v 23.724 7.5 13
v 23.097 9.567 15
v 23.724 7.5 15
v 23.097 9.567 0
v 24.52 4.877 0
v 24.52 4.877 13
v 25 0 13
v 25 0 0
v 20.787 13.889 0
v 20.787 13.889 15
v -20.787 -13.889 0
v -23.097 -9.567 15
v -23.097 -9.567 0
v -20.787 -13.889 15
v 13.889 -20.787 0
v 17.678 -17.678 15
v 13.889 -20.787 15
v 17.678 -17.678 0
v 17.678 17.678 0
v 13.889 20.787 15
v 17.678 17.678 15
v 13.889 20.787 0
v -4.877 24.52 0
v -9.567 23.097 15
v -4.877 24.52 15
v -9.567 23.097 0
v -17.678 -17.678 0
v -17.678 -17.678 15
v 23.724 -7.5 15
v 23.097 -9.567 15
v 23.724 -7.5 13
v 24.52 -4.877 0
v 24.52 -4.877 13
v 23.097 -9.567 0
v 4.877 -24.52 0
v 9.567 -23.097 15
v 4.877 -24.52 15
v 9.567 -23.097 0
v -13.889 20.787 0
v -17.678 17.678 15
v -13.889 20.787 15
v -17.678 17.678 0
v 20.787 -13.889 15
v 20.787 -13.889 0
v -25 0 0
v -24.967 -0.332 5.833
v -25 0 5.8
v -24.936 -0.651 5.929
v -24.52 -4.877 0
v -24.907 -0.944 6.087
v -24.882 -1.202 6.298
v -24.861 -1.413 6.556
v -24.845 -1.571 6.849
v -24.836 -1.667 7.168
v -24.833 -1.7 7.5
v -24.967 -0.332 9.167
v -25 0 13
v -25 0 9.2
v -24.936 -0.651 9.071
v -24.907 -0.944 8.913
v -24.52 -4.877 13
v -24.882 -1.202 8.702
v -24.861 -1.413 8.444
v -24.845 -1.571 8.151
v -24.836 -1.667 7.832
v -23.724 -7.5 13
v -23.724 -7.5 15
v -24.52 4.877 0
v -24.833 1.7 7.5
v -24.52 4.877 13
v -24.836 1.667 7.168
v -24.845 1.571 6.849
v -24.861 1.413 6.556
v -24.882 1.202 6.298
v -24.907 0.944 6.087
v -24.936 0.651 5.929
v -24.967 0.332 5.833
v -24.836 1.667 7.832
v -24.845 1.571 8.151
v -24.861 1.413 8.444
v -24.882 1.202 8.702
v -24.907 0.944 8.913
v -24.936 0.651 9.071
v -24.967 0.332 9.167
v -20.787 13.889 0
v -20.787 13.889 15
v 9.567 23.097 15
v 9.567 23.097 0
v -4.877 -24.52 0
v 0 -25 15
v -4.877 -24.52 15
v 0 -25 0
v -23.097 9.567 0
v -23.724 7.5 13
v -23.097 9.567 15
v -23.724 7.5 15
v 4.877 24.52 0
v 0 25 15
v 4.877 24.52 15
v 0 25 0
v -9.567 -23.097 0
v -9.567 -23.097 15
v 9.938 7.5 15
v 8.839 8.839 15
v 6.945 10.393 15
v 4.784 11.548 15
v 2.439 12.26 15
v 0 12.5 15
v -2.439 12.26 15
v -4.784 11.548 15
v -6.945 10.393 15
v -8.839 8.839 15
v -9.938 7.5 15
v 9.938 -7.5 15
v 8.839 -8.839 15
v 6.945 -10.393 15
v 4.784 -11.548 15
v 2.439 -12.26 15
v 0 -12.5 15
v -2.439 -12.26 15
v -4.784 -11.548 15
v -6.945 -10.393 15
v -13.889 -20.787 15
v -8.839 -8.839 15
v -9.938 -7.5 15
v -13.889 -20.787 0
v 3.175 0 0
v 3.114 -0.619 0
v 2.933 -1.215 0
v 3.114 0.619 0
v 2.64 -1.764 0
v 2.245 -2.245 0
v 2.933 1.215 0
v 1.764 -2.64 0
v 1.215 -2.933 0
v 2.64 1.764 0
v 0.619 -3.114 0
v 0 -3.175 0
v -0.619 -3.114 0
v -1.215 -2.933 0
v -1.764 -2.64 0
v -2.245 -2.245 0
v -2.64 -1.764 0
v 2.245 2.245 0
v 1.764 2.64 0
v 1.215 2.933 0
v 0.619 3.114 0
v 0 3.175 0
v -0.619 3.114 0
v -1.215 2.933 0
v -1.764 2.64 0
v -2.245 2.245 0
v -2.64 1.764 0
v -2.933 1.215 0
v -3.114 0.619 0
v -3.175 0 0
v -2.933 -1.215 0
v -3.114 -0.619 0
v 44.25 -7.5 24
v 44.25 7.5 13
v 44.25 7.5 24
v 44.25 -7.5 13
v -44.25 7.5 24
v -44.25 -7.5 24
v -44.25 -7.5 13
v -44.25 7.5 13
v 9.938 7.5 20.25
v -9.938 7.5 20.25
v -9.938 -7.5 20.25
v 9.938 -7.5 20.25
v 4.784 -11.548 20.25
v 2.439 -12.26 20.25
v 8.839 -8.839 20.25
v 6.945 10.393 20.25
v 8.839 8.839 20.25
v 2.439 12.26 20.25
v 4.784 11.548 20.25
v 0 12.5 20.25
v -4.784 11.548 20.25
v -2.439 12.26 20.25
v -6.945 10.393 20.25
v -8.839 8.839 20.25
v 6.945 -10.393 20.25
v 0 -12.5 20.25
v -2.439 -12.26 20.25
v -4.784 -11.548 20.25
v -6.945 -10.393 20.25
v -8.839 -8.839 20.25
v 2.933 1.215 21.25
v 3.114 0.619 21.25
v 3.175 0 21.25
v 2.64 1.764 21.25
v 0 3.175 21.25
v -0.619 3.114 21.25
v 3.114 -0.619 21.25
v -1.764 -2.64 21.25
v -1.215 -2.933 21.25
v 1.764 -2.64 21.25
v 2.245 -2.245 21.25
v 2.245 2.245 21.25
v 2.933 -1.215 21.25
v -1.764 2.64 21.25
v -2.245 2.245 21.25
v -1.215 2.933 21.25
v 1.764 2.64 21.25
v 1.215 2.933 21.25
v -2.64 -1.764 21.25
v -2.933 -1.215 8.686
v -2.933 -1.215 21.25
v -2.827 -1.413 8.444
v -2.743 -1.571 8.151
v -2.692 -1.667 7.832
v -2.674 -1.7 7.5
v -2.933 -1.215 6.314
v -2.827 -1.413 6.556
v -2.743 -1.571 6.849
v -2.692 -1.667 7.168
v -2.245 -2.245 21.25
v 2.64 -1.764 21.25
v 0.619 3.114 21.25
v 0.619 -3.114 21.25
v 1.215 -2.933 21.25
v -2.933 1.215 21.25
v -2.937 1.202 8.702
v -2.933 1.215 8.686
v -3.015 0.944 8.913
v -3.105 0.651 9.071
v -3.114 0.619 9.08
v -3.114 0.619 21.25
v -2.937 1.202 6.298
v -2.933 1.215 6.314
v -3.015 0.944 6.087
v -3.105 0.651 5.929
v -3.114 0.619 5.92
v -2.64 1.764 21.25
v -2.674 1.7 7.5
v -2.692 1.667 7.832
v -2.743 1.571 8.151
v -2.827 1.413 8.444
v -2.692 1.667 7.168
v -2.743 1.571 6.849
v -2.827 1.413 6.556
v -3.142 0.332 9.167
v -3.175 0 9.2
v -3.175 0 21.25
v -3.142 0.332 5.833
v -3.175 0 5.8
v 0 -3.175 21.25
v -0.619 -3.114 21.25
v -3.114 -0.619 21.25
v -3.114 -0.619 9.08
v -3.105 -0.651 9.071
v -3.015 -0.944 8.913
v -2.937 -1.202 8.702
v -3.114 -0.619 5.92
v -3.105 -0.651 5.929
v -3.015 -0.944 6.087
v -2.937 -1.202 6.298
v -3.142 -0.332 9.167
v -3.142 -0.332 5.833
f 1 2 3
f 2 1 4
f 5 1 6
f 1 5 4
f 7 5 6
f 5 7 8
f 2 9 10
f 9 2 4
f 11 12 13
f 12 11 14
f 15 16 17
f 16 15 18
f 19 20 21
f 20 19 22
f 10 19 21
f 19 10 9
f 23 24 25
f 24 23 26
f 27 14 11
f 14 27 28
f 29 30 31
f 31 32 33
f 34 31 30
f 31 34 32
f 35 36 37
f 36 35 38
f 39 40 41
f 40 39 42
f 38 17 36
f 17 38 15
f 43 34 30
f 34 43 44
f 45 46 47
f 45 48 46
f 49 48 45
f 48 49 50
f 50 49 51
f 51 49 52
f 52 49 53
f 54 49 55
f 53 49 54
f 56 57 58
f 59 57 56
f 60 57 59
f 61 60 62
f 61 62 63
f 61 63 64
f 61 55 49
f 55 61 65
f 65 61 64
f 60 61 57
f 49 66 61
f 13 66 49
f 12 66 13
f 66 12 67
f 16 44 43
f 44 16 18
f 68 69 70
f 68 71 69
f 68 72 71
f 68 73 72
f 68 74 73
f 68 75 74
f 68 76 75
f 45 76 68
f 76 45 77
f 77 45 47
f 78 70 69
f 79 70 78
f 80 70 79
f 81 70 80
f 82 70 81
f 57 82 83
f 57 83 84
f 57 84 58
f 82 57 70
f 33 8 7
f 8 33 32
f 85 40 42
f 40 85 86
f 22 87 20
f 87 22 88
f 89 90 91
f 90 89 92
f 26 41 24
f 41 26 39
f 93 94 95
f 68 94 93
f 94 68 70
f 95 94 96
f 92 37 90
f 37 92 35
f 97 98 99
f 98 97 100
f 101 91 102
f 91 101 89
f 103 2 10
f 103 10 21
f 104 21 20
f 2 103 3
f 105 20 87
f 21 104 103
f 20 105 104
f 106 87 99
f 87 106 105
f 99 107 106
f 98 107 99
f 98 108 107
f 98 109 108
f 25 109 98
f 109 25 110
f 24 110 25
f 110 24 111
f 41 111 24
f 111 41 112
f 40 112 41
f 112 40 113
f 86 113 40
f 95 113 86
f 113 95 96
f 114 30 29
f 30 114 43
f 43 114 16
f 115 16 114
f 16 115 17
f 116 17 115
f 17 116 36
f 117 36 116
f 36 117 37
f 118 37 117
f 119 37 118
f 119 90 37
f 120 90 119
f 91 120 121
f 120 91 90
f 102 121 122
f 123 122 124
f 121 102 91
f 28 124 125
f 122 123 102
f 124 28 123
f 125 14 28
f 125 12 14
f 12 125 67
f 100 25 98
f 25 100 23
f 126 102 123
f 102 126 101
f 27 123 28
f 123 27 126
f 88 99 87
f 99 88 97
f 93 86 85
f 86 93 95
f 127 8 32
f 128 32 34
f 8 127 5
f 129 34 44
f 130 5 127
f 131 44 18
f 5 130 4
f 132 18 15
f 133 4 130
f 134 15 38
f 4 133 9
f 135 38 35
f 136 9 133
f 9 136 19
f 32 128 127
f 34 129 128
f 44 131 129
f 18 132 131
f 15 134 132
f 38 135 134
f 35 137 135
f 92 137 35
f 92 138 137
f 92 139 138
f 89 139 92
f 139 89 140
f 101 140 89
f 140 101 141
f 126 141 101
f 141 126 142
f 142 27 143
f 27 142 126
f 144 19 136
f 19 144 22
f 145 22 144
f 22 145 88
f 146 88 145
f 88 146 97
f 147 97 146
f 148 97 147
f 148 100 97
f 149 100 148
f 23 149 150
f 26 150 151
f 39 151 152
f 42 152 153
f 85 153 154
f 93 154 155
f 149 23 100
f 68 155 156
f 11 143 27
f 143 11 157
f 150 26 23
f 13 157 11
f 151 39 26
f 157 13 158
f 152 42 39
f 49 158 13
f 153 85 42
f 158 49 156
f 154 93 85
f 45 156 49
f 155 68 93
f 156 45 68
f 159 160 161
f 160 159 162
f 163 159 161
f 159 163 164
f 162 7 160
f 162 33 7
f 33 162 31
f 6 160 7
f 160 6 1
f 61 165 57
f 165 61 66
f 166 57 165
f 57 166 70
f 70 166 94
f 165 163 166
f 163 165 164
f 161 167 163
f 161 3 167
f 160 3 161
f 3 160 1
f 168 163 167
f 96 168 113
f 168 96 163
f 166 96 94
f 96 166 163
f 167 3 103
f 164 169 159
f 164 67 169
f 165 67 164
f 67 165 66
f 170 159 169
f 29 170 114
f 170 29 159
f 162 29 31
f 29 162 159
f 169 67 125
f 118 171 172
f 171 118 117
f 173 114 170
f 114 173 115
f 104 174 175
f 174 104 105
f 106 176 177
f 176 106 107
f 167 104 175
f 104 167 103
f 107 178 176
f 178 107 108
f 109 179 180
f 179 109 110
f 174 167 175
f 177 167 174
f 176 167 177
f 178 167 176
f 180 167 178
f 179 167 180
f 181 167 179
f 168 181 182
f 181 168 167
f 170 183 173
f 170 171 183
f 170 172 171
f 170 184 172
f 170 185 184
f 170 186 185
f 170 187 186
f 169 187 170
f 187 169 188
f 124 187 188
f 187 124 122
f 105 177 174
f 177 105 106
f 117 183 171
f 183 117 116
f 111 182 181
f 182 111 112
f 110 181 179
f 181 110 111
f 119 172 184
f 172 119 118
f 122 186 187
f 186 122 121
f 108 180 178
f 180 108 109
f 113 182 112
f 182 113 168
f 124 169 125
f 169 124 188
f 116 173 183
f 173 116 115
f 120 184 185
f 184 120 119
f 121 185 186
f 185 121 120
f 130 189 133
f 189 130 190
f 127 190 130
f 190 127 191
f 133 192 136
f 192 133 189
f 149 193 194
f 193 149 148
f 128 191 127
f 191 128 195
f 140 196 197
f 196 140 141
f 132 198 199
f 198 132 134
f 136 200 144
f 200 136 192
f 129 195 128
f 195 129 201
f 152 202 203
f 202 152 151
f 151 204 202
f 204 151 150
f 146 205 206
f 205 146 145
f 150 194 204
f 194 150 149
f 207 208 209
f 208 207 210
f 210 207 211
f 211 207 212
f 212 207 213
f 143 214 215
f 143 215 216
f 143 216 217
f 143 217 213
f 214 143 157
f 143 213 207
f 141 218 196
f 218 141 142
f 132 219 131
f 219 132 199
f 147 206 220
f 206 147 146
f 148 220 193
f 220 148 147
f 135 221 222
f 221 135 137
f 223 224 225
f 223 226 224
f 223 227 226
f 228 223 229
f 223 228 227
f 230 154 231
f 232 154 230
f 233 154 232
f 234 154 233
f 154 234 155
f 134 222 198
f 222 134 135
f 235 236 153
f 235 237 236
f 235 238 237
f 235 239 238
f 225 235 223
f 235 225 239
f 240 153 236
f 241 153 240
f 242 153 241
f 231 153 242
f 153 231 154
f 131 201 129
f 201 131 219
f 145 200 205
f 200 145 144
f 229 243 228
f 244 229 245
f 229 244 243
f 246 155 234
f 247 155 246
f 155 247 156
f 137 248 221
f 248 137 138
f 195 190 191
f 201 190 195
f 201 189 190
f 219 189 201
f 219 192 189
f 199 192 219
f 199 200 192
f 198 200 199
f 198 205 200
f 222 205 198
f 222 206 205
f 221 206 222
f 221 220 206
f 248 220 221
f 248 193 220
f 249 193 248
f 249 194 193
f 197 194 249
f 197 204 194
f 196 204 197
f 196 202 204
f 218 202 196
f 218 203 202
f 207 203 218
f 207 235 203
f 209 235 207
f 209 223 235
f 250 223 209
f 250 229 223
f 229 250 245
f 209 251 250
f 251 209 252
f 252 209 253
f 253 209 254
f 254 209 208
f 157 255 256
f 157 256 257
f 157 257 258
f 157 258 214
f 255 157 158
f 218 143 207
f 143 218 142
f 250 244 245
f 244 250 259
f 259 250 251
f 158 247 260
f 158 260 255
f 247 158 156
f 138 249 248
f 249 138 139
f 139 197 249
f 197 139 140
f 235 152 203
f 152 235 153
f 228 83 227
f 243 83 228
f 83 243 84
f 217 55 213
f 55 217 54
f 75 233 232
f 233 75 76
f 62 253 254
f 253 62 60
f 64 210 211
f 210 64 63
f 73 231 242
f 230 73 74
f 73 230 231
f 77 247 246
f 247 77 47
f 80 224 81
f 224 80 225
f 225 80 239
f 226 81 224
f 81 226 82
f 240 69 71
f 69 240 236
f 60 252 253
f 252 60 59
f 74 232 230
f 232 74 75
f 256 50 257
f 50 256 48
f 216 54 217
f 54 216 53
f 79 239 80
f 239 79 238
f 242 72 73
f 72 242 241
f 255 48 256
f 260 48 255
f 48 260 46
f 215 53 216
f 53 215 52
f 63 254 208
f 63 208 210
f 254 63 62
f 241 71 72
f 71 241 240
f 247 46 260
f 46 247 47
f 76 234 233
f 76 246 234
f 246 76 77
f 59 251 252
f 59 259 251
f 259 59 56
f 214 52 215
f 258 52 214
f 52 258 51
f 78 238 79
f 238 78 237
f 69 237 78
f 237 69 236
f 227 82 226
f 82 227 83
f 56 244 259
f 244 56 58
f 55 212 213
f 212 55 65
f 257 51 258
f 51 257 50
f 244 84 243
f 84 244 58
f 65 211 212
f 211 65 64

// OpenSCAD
$fn = 32;

// ----------------------------------------------------------------------
// Hand knob: 50 x 88.5 x 20.25 mm
// ----------------------------------------------------------------------

// --- parameters (mm) ---
knob_d = 50;              // knob diameter
knob_h = 15;              // knob height
bore_d = 6.35;            // shaft bore
set_d = 3.4;              // set screw tap hole
wing_l = 88.5;            // wing span
wing_w = 15;              // wing width
wing_h = 9;               // wing thickness
cap_h = 5.25;             // raised centre cap
cap_d = 25;               // centre cap diameter

module body() {
  cylinder(h = knob_h, d = knob_d);
}

module wing() {
  /* wing sunk 2 mm into the knob so the joint overlaps */
  translate([-wing_l / 2, -wing_w / 2, knob_h - 2])
    cube([wing_l, wing_w, wing_h + 2]);
}

module cap() {
  translate([0, 0, knob_h - 1]) cylinder(h = cap_h + 1, d = cap_d);
}

difference() {
  union() {
    body();
    wing();
    cap();
  }
  translate([0, 0, -1]) cylinder(h = knob_h + cap_h + 2, d = bore_d);
  translate([-knob_d / 2 - 1, 0, knob_h * 0.5]) rotate([0, 90, 0]) cylinder(h = knob_d / 2 + 2, d = set_d);
}
